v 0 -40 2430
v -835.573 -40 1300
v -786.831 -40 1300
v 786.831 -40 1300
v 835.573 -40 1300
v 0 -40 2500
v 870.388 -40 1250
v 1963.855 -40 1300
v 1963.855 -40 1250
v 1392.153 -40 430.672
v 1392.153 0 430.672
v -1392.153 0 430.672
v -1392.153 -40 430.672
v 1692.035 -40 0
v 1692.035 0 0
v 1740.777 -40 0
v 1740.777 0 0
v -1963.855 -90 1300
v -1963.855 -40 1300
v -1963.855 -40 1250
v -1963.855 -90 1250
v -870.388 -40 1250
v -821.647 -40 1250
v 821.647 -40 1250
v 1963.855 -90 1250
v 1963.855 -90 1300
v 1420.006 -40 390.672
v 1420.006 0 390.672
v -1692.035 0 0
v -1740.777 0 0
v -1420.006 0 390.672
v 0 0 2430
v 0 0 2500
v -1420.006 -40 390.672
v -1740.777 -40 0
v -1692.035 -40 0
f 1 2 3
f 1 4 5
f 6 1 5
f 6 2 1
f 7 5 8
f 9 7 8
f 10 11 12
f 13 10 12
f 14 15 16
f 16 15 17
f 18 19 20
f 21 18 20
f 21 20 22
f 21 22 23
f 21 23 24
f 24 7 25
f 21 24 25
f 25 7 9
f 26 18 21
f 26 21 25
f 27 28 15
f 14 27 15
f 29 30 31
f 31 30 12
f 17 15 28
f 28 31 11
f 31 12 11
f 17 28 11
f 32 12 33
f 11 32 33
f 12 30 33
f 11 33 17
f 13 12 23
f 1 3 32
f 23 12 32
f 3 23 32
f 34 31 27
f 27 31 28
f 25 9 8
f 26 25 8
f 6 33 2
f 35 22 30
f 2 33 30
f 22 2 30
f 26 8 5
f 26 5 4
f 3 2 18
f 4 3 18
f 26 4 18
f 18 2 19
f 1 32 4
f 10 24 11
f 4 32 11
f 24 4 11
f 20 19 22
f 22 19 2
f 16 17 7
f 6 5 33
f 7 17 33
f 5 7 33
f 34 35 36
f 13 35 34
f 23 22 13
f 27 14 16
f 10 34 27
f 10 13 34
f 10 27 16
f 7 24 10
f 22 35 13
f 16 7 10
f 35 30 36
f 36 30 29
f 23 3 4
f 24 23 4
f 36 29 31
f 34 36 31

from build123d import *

# Parameters (mm, degrees)
F1_DEPTH = 40
F3_DEPTH = 50


with BuildPart() as f1:
    # F0 (on Front) → F1 (new body)
    with BuildSketch(Plane.XZ):
        Polygon((0, 2430), (0, 2500), (-1740.776559557, 0), (-1692.0348158894, 0), (-1420.0056328006, 390.672170985), (-1392.1532078477, 430.672170985), align=None)
        Polygon((1740.776559557, 0), (0, 2500), (0, 2430), (1392.1532078477, 430.672170985), (1420.0056328006, 390.672170985), (1692.0348158894, 0), align=None)
        Polygon((1392.1532078477, 430.672170985), (-1392.1532078477, 430.672170985), (-1420.0056328006, 390.672170985), (1420.0056328006, 390.672170985), align=None)
    extrude(amount=F1_DEPTH)

    # F2 (on face) → F3 (join)
    with BuildSketch(Plane.XZ.offset(40)):
        Polygon((-870.3882797785, 1250), (-835.5727485874, 1300), (-1963.8553857803, 1300), (-1963.8553857803, 1250), align=None)
        Polygon((-786.8310049198, 1300), (-835.5727485874, 1300), (-870.3882797785, 1250), (-821.6465361109, 1250), align=None)
        Polygon((0, 1300), (-786.8310049198, 1300), (-821.6465361109, 1250), (0, 1250), align=None)
        Polygon((786.8310049198, 1300), (0, 1300), (0, 1250), (821.6465361109, 1250), align=None)
        Polygon((870.3882797785, 1250), (835.5727485874, 1300), (786.8310049198, 1300), (821.6465361109, 1250), align=None)
        Polygon((1963.8553857803, 1300), (835.5727485874, 1300), (870.3882797785, 1250), (1963.8553857803, 1250), align=None)
    extrude(amount=F3_DEPTH)


solid = f1.part
